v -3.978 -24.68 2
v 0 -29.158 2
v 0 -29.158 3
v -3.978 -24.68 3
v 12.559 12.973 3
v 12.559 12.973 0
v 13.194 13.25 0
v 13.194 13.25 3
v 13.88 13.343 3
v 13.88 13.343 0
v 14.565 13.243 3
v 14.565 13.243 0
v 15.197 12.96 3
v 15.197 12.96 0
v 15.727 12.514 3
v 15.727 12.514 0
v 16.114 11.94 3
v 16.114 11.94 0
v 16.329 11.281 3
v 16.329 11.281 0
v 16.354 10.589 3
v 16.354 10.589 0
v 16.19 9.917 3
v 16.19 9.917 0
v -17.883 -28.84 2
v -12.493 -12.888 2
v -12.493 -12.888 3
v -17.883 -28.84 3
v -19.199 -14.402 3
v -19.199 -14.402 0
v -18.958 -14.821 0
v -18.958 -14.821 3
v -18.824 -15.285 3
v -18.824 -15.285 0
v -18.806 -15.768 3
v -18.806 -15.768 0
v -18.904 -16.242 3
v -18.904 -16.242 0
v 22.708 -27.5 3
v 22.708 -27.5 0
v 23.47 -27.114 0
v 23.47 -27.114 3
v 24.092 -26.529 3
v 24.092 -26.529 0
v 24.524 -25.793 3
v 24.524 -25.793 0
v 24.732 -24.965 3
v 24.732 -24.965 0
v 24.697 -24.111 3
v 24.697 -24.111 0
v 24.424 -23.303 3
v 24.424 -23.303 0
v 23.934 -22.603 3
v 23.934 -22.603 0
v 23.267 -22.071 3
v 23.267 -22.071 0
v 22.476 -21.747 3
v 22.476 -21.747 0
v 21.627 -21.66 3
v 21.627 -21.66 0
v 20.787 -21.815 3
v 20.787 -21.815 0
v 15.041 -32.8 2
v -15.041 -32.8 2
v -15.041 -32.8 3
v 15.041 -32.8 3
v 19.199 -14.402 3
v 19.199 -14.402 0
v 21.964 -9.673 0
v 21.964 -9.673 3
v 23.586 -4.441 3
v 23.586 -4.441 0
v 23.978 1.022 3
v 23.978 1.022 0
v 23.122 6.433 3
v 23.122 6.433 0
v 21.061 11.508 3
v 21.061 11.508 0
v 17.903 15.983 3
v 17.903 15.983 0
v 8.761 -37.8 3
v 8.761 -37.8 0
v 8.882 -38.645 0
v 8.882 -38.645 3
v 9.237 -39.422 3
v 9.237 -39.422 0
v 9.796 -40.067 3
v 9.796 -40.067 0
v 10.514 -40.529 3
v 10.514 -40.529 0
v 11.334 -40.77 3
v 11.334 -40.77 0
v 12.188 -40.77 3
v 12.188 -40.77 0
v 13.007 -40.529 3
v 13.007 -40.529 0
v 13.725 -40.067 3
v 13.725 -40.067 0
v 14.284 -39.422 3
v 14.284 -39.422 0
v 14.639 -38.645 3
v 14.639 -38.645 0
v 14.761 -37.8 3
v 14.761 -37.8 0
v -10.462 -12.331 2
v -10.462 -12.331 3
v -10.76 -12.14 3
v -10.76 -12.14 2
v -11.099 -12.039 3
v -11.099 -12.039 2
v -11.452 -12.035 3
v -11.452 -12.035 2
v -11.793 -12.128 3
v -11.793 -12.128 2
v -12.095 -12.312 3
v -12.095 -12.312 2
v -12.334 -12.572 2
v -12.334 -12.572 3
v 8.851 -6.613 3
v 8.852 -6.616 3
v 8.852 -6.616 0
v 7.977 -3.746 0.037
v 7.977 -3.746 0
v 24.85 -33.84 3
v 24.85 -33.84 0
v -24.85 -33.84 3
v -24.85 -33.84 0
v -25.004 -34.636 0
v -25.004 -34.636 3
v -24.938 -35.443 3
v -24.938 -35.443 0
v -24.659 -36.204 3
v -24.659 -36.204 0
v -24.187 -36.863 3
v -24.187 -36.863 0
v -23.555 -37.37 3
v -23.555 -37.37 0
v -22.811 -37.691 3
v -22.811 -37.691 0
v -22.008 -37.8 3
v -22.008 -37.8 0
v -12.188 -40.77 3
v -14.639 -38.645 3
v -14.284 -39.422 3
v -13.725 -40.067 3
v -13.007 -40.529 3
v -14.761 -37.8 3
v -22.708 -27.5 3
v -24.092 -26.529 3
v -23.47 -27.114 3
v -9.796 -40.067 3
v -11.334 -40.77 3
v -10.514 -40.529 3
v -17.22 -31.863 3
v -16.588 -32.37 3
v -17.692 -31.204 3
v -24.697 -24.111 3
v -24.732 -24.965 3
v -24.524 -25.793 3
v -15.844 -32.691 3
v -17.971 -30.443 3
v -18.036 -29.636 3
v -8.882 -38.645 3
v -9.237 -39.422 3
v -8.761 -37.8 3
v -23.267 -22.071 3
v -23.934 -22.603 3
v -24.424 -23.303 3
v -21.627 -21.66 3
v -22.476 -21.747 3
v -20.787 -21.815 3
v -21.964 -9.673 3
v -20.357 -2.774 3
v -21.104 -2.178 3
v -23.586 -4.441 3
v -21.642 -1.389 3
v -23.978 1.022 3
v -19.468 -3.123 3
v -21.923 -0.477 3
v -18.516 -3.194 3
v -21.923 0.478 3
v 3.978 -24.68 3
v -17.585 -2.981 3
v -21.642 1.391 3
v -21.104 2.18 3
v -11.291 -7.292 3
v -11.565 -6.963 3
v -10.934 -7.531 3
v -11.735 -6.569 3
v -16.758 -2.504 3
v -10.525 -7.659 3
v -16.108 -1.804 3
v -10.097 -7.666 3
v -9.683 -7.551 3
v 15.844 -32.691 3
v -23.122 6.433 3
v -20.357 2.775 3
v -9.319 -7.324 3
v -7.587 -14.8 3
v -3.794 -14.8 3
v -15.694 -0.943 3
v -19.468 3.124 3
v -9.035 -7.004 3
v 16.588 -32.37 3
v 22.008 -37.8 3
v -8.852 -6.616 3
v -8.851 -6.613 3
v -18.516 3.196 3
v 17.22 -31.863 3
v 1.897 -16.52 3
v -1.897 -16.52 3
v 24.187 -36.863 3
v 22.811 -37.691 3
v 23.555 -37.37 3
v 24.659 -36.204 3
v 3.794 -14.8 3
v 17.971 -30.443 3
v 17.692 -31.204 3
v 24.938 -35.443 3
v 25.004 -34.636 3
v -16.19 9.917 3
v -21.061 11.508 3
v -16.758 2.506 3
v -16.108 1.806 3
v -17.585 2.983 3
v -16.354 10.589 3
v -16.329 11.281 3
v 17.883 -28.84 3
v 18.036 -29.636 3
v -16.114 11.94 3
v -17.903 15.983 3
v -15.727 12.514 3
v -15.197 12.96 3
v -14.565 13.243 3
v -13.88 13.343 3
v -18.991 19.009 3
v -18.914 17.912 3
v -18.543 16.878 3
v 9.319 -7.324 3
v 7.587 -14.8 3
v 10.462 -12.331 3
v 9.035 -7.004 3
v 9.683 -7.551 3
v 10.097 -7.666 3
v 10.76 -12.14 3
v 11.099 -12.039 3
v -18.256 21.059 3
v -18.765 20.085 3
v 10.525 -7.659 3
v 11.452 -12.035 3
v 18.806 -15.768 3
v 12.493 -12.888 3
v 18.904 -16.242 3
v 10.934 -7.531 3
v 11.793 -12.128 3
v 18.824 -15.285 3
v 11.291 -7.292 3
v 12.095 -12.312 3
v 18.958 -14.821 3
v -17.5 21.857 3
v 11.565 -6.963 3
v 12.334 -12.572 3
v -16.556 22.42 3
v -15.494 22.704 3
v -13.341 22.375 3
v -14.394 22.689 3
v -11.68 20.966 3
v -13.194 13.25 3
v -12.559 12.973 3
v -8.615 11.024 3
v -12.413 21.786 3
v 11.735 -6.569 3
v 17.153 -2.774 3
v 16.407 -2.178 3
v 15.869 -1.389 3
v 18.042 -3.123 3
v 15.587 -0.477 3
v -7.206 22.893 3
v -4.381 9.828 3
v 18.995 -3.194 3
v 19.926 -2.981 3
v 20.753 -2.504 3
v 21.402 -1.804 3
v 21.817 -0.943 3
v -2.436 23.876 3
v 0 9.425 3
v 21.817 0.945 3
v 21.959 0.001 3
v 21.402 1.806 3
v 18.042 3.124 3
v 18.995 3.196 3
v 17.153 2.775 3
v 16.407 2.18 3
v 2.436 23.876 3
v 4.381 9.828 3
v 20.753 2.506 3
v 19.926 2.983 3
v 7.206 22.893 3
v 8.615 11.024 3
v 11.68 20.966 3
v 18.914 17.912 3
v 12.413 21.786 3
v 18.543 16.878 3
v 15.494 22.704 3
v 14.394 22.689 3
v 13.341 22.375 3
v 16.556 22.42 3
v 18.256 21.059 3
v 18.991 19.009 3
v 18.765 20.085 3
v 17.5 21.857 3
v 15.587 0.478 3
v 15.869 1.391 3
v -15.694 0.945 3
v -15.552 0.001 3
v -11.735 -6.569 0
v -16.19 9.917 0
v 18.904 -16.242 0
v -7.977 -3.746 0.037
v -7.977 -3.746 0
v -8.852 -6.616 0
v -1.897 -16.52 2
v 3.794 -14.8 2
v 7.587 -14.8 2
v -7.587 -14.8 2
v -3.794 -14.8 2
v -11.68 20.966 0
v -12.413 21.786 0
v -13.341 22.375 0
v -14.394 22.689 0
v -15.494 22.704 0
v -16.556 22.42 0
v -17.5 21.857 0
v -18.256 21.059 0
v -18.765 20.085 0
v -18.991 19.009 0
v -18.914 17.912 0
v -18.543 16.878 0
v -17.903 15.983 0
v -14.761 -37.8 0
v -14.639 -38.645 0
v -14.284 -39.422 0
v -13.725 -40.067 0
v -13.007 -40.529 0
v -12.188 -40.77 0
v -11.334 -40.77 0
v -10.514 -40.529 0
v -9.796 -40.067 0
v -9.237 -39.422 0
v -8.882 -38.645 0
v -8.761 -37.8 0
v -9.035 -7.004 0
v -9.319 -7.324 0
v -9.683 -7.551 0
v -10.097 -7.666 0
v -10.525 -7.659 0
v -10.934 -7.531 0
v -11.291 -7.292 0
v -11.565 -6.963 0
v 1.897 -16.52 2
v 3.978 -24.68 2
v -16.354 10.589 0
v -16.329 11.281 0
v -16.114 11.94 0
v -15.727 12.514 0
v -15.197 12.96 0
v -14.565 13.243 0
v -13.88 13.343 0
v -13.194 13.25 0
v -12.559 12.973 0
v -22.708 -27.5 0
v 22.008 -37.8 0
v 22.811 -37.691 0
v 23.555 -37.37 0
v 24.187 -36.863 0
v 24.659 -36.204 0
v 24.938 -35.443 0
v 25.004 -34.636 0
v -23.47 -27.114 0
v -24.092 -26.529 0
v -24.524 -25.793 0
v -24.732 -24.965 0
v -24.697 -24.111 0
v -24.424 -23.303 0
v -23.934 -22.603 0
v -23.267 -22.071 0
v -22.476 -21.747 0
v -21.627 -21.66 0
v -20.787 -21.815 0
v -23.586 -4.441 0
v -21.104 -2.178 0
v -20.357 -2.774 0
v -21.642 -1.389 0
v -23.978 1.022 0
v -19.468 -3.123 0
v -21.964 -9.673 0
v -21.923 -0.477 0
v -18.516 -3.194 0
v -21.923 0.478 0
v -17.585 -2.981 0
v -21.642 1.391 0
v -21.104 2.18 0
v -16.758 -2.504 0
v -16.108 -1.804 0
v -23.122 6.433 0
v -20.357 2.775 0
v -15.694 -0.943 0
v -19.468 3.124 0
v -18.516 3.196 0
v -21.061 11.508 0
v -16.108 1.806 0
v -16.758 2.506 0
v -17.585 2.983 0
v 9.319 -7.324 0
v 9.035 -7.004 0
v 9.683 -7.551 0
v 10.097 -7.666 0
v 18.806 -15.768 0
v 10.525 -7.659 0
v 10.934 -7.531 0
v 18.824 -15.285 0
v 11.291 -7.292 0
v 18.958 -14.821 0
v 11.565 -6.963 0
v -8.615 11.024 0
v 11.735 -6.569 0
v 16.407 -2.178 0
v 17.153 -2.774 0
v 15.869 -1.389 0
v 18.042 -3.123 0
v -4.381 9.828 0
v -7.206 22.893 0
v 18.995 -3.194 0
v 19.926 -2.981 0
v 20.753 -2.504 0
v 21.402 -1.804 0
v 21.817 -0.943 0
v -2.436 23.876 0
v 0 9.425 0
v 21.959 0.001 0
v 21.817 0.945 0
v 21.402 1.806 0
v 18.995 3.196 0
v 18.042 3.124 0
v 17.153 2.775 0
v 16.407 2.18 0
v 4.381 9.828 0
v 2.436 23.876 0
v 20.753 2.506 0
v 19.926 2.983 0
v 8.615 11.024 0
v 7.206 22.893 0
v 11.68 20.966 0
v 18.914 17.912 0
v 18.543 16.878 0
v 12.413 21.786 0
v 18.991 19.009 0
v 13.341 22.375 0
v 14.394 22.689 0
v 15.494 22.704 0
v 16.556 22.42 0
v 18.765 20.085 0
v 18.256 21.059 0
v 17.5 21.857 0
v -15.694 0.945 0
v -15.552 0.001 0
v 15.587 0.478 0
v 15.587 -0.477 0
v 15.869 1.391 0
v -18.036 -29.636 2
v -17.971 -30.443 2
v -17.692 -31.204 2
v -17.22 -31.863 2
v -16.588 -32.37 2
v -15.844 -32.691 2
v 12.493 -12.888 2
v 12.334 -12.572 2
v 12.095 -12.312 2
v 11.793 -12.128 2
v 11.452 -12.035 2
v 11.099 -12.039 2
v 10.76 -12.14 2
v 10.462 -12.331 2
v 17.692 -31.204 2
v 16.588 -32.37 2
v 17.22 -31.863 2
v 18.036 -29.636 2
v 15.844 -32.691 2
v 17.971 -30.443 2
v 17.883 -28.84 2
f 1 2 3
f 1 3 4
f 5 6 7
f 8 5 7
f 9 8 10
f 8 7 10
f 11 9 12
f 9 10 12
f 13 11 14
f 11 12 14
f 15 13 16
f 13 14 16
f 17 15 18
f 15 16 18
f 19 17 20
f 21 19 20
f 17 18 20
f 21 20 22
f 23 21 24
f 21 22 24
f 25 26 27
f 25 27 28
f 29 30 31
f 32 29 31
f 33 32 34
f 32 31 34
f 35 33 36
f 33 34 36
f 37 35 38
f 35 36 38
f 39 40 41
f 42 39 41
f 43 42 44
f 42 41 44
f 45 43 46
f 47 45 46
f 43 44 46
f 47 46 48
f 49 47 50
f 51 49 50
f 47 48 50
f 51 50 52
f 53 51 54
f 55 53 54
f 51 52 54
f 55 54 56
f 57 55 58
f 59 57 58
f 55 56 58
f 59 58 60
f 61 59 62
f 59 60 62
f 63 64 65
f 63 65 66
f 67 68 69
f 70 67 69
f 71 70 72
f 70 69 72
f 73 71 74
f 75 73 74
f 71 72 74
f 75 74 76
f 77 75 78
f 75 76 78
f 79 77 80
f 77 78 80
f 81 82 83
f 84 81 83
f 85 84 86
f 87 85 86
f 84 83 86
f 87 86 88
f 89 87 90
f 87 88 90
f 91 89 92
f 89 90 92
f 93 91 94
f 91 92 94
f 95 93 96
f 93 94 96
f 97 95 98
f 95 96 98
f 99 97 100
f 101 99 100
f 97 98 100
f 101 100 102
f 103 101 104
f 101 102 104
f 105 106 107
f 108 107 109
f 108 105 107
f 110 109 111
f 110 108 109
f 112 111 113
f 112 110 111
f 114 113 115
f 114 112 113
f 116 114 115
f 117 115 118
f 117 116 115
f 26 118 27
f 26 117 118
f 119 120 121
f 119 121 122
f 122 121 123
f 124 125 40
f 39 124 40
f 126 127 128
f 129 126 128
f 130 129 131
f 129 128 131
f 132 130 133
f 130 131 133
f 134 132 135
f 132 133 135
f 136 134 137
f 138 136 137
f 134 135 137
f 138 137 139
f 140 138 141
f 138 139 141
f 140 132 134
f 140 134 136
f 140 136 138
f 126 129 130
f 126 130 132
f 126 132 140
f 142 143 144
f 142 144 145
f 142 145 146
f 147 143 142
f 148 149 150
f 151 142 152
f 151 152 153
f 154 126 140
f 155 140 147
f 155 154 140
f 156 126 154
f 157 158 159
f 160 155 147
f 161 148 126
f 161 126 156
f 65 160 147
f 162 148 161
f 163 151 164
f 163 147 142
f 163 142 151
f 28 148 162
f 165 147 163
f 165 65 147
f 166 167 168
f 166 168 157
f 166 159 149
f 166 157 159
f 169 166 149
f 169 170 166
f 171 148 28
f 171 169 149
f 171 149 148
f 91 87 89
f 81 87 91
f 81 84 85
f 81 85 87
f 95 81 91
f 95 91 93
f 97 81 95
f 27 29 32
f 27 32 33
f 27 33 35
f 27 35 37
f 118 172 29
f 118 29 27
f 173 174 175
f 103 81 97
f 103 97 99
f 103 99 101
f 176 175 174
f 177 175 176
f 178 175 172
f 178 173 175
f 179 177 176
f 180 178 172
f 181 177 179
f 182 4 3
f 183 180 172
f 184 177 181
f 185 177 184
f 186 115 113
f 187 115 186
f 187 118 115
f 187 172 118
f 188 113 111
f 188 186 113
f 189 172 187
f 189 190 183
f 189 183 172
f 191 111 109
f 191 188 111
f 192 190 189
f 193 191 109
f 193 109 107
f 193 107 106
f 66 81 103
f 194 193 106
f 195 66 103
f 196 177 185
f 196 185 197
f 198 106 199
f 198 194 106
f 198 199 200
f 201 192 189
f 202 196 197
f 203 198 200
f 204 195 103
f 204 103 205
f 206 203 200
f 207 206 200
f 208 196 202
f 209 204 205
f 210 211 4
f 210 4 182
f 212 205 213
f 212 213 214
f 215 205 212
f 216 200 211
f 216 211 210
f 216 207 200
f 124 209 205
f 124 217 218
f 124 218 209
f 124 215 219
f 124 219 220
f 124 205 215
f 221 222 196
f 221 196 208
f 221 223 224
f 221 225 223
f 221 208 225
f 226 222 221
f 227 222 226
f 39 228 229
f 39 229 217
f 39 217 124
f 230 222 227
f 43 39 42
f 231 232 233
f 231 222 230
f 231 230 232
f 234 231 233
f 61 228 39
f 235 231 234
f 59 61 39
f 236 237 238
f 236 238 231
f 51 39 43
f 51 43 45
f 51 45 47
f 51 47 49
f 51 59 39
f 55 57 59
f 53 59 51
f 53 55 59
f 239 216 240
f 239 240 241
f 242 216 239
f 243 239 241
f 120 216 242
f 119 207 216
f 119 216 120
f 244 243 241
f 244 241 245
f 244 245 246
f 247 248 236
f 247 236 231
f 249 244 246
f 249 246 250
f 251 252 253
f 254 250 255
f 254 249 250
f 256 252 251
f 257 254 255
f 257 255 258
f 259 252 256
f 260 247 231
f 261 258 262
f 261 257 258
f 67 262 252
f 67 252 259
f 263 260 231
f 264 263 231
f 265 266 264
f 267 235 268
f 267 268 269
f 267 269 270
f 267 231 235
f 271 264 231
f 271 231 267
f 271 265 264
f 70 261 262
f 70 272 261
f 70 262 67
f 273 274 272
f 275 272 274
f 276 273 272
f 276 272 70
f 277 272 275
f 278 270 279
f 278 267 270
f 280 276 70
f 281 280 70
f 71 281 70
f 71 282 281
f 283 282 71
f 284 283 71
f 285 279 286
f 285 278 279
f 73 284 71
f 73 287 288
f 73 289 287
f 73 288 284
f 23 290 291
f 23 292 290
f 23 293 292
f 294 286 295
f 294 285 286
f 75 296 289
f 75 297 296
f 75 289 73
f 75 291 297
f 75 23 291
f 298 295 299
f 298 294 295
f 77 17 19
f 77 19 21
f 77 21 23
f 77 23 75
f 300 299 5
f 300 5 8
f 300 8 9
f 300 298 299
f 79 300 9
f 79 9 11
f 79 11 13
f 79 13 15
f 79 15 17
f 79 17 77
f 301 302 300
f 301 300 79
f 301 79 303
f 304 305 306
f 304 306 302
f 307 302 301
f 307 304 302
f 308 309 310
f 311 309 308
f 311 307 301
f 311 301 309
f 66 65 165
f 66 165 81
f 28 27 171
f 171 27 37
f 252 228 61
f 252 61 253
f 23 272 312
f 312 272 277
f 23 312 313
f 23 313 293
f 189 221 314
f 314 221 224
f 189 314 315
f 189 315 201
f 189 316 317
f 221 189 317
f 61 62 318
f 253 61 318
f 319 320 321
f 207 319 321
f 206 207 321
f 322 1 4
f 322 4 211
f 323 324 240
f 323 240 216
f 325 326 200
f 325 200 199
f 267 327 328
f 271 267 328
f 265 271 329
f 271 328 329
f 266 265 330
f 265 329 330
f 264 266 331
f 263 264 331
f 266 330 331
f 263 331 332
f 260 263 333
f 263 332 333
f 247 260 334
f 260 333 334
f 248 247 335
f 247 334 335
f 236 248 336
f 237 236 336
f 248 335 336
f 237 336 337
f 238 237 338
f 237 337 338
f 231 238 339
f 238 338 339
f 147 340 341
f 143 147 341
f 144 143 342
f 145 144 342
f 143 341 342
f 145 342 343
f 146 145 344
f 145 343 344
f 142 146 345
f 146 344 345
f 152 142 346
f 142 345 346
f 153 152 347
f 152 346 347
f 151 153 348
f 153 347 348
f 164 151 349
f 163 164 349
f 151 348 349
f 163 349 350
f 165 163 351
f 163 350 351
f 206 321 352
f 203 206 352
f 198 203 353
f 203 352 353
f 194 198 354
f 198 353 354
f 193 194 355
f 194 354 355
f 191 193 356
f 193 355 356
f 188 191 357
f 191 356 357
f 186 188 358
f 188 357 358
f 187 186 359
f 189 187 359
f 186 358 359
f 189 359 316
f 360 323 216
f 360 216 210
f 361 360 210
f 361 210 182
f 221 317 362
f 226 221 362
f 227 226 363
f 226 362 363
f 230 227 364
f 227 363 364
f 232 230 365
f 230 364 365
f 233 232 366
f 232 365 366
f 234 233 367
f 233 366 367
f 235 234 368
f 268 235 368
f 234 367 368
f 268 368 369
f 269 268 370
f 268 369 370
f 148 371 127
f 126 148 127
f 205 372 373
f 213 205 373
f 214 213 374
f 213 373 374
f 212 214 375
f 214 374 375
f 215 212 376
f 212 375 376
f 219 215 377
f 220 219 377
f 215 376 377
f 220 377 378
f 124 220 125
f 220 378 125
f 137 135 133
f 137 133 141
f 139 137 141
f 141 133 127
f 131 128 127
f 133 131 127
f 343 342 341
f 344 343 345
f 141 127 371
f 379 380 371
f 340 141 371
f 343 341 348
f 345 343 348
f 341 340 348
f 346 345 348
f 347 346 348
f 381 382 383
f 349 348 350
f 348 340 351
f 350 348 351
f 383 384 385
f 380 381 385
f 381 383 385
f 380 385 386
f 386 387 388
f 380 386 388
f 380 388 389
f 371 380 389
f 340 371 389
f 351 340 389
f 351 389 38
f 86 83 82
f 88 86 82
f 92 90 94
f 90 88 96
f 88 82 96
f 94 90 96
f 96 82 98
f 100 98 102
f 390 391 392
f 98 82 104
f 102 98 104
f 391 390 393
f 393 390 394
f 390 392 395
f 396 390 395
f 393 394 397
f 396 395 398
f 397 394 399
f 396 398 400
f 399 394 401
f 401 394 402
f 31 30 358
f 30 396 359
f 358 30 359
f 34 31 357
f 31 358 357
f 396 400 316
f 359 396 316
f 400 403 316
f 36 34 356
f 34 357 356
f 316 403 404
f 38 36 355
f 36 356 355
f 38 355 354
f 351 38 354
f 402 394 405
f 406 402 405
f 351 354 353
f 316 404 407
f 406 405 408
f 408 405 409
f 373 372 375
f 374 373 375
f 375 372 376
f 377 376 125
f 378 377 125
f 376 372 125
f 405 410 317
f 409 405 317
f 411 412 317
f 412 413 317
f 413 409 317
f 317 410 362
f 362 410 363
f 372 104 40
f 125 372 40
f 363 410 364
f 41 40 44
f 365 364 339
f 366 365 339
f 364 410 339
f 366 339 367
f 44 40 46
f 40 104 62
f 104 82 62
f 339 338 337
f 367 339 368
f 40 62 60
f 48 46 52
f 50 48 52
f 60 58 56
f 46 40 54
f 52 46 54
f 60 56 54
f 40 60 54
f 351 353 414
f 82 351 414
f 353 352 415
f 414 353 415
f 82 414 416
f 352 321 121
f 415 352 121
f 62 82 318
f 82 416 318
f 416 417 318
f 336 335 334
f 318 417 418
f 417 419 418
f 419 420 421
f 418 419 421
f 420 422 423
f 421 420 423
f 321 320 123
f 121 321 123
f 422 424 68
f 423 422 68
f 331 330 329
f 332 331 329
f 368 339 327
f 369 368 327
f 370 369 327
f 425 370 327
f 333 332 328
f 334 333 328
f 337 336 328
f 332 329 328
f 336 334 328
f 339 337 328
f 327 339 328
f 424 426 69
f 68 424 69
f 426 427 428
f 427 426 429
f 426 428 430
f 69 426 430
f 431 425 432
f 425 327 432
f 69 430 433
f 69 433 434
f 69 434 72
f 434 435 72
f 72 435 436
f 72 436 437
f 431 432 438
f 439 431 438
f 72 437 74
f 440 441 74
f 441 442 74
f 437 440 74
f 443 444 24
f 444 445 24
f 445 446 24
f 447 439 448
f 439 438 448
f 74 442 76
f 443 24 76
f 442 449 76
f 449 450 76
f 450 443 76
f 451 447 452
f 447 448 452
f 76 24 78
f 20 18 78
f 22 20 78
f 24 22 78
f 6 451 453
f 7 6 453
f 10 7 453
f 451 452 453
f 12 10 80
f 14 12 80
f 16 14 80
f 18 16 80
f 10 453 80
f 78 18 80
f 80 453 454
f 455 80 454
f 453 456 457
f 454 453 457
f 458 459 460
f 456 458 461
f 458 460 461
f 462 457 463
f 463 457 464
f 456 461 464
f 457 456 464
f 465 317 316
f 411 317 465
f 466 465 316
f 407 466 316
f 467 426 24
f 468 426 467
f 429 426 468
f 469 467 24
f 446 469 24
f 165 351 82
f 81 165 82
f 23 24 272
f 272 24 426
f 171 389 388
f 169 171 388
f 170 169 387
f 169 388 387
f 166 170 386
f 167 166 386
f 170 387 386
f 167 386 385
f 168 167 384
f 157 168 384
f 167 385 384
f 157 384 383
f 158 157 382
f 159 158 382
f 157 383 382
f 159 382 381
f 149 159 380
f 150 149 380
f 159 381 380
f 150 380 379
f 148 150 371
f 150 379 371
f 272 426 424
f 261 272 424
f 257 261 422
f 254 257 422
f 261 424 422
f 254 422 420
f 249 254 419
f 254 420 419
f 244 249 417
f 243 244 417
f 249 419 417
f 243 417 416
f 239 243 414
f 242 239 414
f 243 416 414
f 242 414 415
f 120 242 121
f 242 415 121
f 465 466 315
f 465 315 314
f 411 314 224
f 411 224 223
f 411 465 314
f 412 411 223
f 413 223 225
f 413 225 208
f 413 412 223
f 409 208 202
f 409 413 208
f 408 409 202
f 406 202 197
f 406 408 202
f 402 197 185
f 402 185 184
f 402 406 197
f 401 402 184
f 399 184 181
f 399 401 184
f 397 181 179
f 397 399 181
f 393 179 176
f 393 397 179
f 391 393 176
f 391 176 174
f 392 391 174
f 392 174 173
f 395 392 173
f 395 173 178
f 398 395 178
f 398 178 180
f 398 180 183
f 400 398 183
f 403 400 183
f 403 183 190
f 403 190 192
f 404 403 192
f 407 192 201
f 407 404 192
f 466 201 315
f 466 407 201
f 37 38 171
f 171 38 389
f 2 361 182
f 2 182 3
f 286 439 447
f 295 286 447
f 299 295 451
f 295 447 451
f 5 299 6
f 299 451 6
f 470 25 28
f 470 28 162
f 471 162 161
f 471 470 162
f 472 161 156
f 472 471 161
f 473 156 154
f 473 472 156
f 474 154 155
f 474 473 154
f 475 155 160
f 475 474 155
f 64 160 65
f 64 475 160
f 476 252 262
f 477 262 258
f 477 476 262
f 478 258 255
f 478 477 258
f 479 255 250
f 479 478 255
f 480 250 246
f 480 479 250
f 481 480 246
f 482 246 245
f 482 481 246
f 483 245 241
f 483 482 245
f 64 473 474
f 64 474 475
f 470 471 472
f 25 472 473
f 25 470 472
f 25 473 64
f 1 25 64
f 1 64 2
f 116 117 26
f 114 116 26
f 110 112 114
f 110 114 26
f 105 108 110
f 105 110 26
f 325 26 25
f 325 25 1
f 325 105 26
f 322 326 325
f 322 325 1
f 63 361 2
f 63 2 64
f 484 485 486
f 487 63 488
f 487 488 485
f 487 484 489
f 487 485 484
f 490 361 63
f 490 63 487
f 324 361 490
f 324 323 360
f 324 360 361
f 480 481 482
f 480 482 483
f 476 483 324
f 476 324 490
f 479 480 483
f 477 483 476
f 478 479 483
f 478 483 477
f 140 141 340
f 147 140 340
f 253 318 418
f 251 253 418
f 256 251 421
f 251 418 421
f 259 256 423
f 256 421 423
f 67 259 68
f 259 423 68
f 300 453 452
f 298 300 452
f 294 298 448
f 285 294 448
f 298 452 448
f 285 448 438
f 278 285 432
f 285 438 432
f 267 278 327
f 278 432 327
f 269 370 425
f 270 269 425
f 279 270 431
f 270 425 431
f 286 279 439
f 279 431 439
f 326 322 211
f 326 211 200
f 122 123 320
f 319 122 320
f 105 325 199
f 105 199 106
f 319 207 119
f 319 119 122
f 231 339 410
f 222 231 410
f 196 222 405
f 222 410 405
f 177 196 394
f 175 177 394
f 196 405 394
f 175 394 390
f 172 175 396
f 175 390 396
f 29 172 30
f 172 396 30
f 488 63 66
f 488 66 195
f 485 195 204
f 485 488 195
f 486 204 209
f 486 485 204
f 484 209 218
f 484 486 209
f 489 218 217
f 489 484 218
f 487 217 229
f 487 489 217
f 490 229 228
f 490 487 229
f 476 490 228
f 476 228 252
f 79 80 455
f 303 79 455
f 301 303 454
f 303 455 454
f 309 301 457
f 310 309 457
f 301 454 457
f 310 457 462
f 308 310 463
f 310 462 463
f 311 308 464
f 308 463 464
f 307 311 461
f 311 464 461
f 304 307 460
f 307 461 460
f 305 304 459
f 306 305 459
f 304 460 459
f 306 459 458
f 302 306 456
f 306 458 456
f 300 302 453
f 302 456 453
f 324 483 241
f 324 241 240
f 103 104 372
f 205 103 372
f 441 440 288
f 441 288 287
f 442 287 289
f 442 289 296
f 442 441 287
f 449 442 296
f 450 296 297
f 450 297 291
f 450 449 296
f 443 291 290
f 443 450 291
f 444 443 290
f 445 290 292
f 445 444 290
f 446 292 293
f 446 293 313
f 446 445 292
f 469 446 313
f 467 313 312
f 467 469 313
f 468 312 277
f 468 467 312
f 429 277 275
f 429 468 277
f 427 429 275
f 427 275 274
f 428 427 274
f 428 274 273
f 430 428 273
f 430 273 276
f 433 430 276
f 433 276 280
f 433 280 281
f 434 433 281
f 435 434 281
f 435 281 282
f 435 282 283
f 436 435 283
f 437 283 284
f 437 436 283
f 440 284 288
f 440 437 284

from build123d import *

# Parameters (mm, degrees)
F0_R     = 3.203715
F1_DEPTH = 3
F2_DEPTH = 25.4
F3_DEPTH = 2
F5_DEPTH = 10


with BuildPart() as f1:
    # F0 (on Top) → F1 (new body)
    with BuildSketch(Plane.XY):
        with BuildLine():
            ThreePointArc((-11.680029, 20.96609), (-17.5, 21.857493), (-17.903305, 15.983481))
            ThreePointArc((-17.903305, 15.983481), (-23.978213, 1.022394), (-19.198874, -14.401501))
            ThreePointArc((-19.198874, -14.401501), (-18.823966, -15.285228), (-18.90402, -16.241848))
            Line((-18.90402, -16.241848), (-20.787271, -21.815403))
            ThreePointArc((-20.787271, -21.815403), (-24.589744, -23.697211), (-22.707936, -27.499683))
            Line((-22.707936, -27.499683), (-24.850231, -33.839886))
            ThreePointArc((-24.850231, -33.839886), (-24.445404, -36.549362), (-22.00809, -37.800219))
            Line((-22.00809, -37.800219), (-14.760585, -37.800219))
            ThreePointArc((-14.760585, -37.800219), (-11.760585, -40.800219), (-8.760585, -37.800219))
            Line((-8.760585, -37.800219), (8.760585, -37.800219))
            ThreePointArc((8.760585, -37.800219), (11.760585, -40.800219), (14.760585, -37.800219))
            Line((14.760585, -37.800219), (22.00809, -37.800219))
            ThreePointArc((22.00809, -37.800219), (24.445404, -36.549362), (24.850231, -33.839886))
            Line((24.850231, -33.839886), (22.707936, -27.499683))
            ThreePointArc((22.707936, -27.499683), (24.589744, -23.697211), (20.787271, -21.815403))
            Line((20.787271, -21.815403), (18.90402, -16.241848))
            ThreePointArc((18.90402, -16.241848), (18.823966, -15.285228), (19.198874, -14.401501))
            ThreePointArc((19.198874, -14.401501), (23.978213, 1.022394), (17.903305, 15.983481))
            ThreePointArc((17.903305, 15.983481), (17.5, 21.857493), (11.680029, 20.96609))
            ThreePointArc((11.680029, 20.96609), (0, 24), (-11.680029, 20.96609))
        make_face()
        with BuildLine():
            Line((0, -32.800219), (-15.040925, -32.800219))
            ThreePointArc((-15.040925, -32.800219), (-17.478239, -31.549362), (-17.883065, -28.839886))
            Line((-17.883065, -28.839886), (-12.493026, -12.88786))
            ThreePointArc((-12.493026, -12.88786), (-11.625772, -12.069632), (-10.462435, -12.330929))
            Line((-10.462435, -12.330929), (-7.587114, -14.800219))
            Line((-7.587114, -14.800219), (-3.793557, -14.800219))
            Line((-3.793557, -14.800219), (0, -14.800219))
            Line((0, -14.800219), (3.793557, -14.800219))
            Line((3.793557, -14.800219), (7.587114, -14.800219))
            Line((7.587114, -14.800219), (10.462435, -12.330929))
            ThreePointArc((10.462435, -12.330929), (11.625772, -12.069632), (12.493026, -12.88786))
            Line((12.493026, -12.88786), (17.883065, -28.839886))
            ThreePointArc((17.883065, -28.839886), (17.478239, -31.549362), (15.040925, -32.800219))
            Line((15.040925, -32.800219), (0, -32.800219))
        make_face(mode=Mode.SUBTRACT)
        with Locations((-18.755235, 0.000856)):
            Circle(F0_R, mode=Mode.SUBTRACT)
        with BuildLine():
            ThreePointArc((0, 9.424817), (6.525388, 10.328945), (12.559127, 12.973208))
            ThreePointArc((12.559127, 12.973208), (15.477463, 12.755317), (16.189543, 9.916814))
            Line((16.189543, 9.916814), (11.735012, -6.569164))
            ThreePointArc((11.735012, -6.569164), (10.311116, -7.677698), (8.852234, -6.615628))
            Line((8.852234, -6.615628), (-8.852234, -6.615628))
            ThreePointArc((-8.852234, -6.615628), (-10.311116, -7.677698), (-11.735012, -6.569164))
            Line((-11.735012, -6.569164), (-16.189543, 9.916814))
            ThreePointArc((-16.189543, 9.916814), (-15.477463, 12.755317), (-12.559127, 12.973208))
            ThreePointArc((-12.559127, 12.973208), (-6.525388, 10.328945), (0, 9.424817))
        make_face(mode=Mode.SUBTRACT)
        with Locations((18.755235, 0.000856)):
            Circle(F0_R, mode=Mode.SUBTRACT)
        with BuildLine():
            ThreePointArc((-17.883065, -28.839886), (-17.478239, -31.549362), (-15.040925, -32.800219))
            Line((-15.040925, -32.800219), (0, -32.800219))
            Line((0, -32.800219), (15.040925, -32.800219))
            ThreePointArc((15.040925, -32.800219), (17.478239, -31.549362), (17.883065, -28.839886))
            Line((17.883065, -28.839886), (12.493026, -12.88786))
            ThreePointArc((12.493026, -12.88786), (11.625772, -12.069632), (10.462435, -12.330929))
            Line((10.462435, -12.330929), (7.587114, -14.800219))
            Line((7.587114, -14.800219), (3.793557, -14.800219))
            Line((3.793557, -14.800219), (1.896779, -16.519575))
            Line((1.896779, -16.519575), (3.978112, -24.680085))
            Line((3.978112, -24.680085), (0, -29.158387))
            Line((0, -29.158387), (-3.978112, -24.680085))
            Line((-3.978112, -24.680085), (-1.896779, -16.519575))
            Line((-1.896779, -16.519575), (-3.793557, -14.800219))
            Line((-3.793557, -14.800219), (-7.587114, -14.800219))
            Line((-7.587114, -14.800219), (-10.462435, -12.330929))
            ThreePointArc((-10.462435, -12.330929), (-11.625772, -12.069632), (-12.493026, -12.88786))
            Line((-12.493026, -12.88786), (-17.883065, -28.839886))
        make_face()
        Polygon((0, -18.238932), (-1.896779, -16.519575), (-3.978112, -24.680085), (0, -29.158387), (3.978112, -24.680085), (1.896779, -16.519575), align=None)
        Polygon((0, -14.800219), (-3.793557, -14.800219), (-1.896779, -16.519575), (0, -18.238932), (1.896779, -16.519575), (3.793557, -14.800219), align=None)
        Polygon((-8.852234, -6.615628), (8.852234, -6.615628), (7.976763, -3.746212), (0, -3.746212), (-7.976763, -3.746212), align=None)
    extrude(amount=F1_DEPTH)

    # F0 (on Top) → F2 (cut)
    with BuildSketch(Plane.XY):
        with BuildLine():
            ThreePointArc((-17.883065, -28.839886), (-17.478239, -31.549362), (-15.040925, -32.800219))
            Line((-15.040925, -32.800219), (0, -32.800219))
            Line((0, -32.800219), (15.040925, -32.800219))
            ThreePointArc((15.040925, -32.800219), (17.478239, -31.549362), (17.883065, -28.839886))
            Line((17.883065, -28.839886), (12.493026, -12.88786))
            ThreePointArc((12.493026, -12.88786), (11.625772, -12.069632), (10.462435, -12.330929))
            Line((10.462435, -12.330929), (7.587114, -14.800219))
            Line((7.587114, -14.800219), (3.793557, -14.800219))
            Line((3.793557, -14.800219), (1.896779, -16.519575))
            Line((1.896779, -16.519575), (3.978112, -24.680085))
            Line((3.978112, -24.680085), (0, -29.158387))
            Line((0, -29.158387), (-3.978112, -24.680085))
            Line((-3.978112, -24.680085), (-1.896779, -16.519575))
            Line((-1.896779, -16.519575), (-3.793557, -14.800219))
            Line((-3.793557, -14.800219), (-7.587114, -14.800219))
            Line((-7.587114, -14.800219), (-10.462435, -12.330929))
            ThreePointArc((-10.462435, -12.330929), (-11.625772, -12.069632), (-12.493026, -12.88786))
            Line((-12.493026, -12.88786), (-17.883065, -28.839886))
        make_face()
    extrude(amount=F2_DEPTH, mode=Mode.SUBTRACT)

    # F0 (on Top) → F3 (join)
    with BuildSketch(Plane.XY):
        with BuildLine():
            ThreePointArc((-17.883065, -28.839886), (-17.478239, -31.549362), (-15.040925, -32.800219))
            Line((-15.040925, -32.800219), (0, -32.800219))
            Line((0, -32.800219), (15.040925, -32.800219))
            ThreePointArc((15.040925, -32.800219), (17.478239, -31.549362), (17.883065, -28.839886))
            Line((17.883065, -28.839886), (12.493026, -12.88786))
            ThreePointArc((12.493026, -12.88786), (11.625772, -12.069632), (10.462435, -12.330929))
            Line((10.462435, -12.330929), (7.587114, -14.800219))
            Line((7.587114, -14.800219), (3.793557, -14.800219))
            Line((3.793557, -14.800219), (1.896779, -16.519575))
            Line((1.896779, -16.519575), (3.978112, -24.680085))
            Line((3.978112, -24.680085), (0, -29.158387))
            Line((0, -29.158387), (-3.978112, -24.680085))
            Line((-3.978112, -24.680085), (-1.896779, -16.519575))
            Line((-1.896779, -16.519575), (-3.793557, -14.800219))
            Line((-3.793557, -14.800219), (-7.587114, -14.800219))
            Line((-7.587114, -14.800219), (-10.462435, -12.330929))
            ThreePointArc((-10.462435, -12.330929), (-11.625772, -12.069632), (-12.493026, -12.88786))
            Line((-12.493026, -12.88786), (-17.883065, -28.839886))
        make_face()
    extrude(amount=F3_DEPTH)

    # F4 (on Right) → F5 (cut, symmetric)
    with BuildSketch(Plane.YZ):
        Polygon((-3.716471, 3.089604), (-6.690737, 3.080773), (-3.710722, 0), align=None)
    extrude(amount=F5_DEPTH, both=True, mode=Mode.SUBTRACT)


solid = f1.part
